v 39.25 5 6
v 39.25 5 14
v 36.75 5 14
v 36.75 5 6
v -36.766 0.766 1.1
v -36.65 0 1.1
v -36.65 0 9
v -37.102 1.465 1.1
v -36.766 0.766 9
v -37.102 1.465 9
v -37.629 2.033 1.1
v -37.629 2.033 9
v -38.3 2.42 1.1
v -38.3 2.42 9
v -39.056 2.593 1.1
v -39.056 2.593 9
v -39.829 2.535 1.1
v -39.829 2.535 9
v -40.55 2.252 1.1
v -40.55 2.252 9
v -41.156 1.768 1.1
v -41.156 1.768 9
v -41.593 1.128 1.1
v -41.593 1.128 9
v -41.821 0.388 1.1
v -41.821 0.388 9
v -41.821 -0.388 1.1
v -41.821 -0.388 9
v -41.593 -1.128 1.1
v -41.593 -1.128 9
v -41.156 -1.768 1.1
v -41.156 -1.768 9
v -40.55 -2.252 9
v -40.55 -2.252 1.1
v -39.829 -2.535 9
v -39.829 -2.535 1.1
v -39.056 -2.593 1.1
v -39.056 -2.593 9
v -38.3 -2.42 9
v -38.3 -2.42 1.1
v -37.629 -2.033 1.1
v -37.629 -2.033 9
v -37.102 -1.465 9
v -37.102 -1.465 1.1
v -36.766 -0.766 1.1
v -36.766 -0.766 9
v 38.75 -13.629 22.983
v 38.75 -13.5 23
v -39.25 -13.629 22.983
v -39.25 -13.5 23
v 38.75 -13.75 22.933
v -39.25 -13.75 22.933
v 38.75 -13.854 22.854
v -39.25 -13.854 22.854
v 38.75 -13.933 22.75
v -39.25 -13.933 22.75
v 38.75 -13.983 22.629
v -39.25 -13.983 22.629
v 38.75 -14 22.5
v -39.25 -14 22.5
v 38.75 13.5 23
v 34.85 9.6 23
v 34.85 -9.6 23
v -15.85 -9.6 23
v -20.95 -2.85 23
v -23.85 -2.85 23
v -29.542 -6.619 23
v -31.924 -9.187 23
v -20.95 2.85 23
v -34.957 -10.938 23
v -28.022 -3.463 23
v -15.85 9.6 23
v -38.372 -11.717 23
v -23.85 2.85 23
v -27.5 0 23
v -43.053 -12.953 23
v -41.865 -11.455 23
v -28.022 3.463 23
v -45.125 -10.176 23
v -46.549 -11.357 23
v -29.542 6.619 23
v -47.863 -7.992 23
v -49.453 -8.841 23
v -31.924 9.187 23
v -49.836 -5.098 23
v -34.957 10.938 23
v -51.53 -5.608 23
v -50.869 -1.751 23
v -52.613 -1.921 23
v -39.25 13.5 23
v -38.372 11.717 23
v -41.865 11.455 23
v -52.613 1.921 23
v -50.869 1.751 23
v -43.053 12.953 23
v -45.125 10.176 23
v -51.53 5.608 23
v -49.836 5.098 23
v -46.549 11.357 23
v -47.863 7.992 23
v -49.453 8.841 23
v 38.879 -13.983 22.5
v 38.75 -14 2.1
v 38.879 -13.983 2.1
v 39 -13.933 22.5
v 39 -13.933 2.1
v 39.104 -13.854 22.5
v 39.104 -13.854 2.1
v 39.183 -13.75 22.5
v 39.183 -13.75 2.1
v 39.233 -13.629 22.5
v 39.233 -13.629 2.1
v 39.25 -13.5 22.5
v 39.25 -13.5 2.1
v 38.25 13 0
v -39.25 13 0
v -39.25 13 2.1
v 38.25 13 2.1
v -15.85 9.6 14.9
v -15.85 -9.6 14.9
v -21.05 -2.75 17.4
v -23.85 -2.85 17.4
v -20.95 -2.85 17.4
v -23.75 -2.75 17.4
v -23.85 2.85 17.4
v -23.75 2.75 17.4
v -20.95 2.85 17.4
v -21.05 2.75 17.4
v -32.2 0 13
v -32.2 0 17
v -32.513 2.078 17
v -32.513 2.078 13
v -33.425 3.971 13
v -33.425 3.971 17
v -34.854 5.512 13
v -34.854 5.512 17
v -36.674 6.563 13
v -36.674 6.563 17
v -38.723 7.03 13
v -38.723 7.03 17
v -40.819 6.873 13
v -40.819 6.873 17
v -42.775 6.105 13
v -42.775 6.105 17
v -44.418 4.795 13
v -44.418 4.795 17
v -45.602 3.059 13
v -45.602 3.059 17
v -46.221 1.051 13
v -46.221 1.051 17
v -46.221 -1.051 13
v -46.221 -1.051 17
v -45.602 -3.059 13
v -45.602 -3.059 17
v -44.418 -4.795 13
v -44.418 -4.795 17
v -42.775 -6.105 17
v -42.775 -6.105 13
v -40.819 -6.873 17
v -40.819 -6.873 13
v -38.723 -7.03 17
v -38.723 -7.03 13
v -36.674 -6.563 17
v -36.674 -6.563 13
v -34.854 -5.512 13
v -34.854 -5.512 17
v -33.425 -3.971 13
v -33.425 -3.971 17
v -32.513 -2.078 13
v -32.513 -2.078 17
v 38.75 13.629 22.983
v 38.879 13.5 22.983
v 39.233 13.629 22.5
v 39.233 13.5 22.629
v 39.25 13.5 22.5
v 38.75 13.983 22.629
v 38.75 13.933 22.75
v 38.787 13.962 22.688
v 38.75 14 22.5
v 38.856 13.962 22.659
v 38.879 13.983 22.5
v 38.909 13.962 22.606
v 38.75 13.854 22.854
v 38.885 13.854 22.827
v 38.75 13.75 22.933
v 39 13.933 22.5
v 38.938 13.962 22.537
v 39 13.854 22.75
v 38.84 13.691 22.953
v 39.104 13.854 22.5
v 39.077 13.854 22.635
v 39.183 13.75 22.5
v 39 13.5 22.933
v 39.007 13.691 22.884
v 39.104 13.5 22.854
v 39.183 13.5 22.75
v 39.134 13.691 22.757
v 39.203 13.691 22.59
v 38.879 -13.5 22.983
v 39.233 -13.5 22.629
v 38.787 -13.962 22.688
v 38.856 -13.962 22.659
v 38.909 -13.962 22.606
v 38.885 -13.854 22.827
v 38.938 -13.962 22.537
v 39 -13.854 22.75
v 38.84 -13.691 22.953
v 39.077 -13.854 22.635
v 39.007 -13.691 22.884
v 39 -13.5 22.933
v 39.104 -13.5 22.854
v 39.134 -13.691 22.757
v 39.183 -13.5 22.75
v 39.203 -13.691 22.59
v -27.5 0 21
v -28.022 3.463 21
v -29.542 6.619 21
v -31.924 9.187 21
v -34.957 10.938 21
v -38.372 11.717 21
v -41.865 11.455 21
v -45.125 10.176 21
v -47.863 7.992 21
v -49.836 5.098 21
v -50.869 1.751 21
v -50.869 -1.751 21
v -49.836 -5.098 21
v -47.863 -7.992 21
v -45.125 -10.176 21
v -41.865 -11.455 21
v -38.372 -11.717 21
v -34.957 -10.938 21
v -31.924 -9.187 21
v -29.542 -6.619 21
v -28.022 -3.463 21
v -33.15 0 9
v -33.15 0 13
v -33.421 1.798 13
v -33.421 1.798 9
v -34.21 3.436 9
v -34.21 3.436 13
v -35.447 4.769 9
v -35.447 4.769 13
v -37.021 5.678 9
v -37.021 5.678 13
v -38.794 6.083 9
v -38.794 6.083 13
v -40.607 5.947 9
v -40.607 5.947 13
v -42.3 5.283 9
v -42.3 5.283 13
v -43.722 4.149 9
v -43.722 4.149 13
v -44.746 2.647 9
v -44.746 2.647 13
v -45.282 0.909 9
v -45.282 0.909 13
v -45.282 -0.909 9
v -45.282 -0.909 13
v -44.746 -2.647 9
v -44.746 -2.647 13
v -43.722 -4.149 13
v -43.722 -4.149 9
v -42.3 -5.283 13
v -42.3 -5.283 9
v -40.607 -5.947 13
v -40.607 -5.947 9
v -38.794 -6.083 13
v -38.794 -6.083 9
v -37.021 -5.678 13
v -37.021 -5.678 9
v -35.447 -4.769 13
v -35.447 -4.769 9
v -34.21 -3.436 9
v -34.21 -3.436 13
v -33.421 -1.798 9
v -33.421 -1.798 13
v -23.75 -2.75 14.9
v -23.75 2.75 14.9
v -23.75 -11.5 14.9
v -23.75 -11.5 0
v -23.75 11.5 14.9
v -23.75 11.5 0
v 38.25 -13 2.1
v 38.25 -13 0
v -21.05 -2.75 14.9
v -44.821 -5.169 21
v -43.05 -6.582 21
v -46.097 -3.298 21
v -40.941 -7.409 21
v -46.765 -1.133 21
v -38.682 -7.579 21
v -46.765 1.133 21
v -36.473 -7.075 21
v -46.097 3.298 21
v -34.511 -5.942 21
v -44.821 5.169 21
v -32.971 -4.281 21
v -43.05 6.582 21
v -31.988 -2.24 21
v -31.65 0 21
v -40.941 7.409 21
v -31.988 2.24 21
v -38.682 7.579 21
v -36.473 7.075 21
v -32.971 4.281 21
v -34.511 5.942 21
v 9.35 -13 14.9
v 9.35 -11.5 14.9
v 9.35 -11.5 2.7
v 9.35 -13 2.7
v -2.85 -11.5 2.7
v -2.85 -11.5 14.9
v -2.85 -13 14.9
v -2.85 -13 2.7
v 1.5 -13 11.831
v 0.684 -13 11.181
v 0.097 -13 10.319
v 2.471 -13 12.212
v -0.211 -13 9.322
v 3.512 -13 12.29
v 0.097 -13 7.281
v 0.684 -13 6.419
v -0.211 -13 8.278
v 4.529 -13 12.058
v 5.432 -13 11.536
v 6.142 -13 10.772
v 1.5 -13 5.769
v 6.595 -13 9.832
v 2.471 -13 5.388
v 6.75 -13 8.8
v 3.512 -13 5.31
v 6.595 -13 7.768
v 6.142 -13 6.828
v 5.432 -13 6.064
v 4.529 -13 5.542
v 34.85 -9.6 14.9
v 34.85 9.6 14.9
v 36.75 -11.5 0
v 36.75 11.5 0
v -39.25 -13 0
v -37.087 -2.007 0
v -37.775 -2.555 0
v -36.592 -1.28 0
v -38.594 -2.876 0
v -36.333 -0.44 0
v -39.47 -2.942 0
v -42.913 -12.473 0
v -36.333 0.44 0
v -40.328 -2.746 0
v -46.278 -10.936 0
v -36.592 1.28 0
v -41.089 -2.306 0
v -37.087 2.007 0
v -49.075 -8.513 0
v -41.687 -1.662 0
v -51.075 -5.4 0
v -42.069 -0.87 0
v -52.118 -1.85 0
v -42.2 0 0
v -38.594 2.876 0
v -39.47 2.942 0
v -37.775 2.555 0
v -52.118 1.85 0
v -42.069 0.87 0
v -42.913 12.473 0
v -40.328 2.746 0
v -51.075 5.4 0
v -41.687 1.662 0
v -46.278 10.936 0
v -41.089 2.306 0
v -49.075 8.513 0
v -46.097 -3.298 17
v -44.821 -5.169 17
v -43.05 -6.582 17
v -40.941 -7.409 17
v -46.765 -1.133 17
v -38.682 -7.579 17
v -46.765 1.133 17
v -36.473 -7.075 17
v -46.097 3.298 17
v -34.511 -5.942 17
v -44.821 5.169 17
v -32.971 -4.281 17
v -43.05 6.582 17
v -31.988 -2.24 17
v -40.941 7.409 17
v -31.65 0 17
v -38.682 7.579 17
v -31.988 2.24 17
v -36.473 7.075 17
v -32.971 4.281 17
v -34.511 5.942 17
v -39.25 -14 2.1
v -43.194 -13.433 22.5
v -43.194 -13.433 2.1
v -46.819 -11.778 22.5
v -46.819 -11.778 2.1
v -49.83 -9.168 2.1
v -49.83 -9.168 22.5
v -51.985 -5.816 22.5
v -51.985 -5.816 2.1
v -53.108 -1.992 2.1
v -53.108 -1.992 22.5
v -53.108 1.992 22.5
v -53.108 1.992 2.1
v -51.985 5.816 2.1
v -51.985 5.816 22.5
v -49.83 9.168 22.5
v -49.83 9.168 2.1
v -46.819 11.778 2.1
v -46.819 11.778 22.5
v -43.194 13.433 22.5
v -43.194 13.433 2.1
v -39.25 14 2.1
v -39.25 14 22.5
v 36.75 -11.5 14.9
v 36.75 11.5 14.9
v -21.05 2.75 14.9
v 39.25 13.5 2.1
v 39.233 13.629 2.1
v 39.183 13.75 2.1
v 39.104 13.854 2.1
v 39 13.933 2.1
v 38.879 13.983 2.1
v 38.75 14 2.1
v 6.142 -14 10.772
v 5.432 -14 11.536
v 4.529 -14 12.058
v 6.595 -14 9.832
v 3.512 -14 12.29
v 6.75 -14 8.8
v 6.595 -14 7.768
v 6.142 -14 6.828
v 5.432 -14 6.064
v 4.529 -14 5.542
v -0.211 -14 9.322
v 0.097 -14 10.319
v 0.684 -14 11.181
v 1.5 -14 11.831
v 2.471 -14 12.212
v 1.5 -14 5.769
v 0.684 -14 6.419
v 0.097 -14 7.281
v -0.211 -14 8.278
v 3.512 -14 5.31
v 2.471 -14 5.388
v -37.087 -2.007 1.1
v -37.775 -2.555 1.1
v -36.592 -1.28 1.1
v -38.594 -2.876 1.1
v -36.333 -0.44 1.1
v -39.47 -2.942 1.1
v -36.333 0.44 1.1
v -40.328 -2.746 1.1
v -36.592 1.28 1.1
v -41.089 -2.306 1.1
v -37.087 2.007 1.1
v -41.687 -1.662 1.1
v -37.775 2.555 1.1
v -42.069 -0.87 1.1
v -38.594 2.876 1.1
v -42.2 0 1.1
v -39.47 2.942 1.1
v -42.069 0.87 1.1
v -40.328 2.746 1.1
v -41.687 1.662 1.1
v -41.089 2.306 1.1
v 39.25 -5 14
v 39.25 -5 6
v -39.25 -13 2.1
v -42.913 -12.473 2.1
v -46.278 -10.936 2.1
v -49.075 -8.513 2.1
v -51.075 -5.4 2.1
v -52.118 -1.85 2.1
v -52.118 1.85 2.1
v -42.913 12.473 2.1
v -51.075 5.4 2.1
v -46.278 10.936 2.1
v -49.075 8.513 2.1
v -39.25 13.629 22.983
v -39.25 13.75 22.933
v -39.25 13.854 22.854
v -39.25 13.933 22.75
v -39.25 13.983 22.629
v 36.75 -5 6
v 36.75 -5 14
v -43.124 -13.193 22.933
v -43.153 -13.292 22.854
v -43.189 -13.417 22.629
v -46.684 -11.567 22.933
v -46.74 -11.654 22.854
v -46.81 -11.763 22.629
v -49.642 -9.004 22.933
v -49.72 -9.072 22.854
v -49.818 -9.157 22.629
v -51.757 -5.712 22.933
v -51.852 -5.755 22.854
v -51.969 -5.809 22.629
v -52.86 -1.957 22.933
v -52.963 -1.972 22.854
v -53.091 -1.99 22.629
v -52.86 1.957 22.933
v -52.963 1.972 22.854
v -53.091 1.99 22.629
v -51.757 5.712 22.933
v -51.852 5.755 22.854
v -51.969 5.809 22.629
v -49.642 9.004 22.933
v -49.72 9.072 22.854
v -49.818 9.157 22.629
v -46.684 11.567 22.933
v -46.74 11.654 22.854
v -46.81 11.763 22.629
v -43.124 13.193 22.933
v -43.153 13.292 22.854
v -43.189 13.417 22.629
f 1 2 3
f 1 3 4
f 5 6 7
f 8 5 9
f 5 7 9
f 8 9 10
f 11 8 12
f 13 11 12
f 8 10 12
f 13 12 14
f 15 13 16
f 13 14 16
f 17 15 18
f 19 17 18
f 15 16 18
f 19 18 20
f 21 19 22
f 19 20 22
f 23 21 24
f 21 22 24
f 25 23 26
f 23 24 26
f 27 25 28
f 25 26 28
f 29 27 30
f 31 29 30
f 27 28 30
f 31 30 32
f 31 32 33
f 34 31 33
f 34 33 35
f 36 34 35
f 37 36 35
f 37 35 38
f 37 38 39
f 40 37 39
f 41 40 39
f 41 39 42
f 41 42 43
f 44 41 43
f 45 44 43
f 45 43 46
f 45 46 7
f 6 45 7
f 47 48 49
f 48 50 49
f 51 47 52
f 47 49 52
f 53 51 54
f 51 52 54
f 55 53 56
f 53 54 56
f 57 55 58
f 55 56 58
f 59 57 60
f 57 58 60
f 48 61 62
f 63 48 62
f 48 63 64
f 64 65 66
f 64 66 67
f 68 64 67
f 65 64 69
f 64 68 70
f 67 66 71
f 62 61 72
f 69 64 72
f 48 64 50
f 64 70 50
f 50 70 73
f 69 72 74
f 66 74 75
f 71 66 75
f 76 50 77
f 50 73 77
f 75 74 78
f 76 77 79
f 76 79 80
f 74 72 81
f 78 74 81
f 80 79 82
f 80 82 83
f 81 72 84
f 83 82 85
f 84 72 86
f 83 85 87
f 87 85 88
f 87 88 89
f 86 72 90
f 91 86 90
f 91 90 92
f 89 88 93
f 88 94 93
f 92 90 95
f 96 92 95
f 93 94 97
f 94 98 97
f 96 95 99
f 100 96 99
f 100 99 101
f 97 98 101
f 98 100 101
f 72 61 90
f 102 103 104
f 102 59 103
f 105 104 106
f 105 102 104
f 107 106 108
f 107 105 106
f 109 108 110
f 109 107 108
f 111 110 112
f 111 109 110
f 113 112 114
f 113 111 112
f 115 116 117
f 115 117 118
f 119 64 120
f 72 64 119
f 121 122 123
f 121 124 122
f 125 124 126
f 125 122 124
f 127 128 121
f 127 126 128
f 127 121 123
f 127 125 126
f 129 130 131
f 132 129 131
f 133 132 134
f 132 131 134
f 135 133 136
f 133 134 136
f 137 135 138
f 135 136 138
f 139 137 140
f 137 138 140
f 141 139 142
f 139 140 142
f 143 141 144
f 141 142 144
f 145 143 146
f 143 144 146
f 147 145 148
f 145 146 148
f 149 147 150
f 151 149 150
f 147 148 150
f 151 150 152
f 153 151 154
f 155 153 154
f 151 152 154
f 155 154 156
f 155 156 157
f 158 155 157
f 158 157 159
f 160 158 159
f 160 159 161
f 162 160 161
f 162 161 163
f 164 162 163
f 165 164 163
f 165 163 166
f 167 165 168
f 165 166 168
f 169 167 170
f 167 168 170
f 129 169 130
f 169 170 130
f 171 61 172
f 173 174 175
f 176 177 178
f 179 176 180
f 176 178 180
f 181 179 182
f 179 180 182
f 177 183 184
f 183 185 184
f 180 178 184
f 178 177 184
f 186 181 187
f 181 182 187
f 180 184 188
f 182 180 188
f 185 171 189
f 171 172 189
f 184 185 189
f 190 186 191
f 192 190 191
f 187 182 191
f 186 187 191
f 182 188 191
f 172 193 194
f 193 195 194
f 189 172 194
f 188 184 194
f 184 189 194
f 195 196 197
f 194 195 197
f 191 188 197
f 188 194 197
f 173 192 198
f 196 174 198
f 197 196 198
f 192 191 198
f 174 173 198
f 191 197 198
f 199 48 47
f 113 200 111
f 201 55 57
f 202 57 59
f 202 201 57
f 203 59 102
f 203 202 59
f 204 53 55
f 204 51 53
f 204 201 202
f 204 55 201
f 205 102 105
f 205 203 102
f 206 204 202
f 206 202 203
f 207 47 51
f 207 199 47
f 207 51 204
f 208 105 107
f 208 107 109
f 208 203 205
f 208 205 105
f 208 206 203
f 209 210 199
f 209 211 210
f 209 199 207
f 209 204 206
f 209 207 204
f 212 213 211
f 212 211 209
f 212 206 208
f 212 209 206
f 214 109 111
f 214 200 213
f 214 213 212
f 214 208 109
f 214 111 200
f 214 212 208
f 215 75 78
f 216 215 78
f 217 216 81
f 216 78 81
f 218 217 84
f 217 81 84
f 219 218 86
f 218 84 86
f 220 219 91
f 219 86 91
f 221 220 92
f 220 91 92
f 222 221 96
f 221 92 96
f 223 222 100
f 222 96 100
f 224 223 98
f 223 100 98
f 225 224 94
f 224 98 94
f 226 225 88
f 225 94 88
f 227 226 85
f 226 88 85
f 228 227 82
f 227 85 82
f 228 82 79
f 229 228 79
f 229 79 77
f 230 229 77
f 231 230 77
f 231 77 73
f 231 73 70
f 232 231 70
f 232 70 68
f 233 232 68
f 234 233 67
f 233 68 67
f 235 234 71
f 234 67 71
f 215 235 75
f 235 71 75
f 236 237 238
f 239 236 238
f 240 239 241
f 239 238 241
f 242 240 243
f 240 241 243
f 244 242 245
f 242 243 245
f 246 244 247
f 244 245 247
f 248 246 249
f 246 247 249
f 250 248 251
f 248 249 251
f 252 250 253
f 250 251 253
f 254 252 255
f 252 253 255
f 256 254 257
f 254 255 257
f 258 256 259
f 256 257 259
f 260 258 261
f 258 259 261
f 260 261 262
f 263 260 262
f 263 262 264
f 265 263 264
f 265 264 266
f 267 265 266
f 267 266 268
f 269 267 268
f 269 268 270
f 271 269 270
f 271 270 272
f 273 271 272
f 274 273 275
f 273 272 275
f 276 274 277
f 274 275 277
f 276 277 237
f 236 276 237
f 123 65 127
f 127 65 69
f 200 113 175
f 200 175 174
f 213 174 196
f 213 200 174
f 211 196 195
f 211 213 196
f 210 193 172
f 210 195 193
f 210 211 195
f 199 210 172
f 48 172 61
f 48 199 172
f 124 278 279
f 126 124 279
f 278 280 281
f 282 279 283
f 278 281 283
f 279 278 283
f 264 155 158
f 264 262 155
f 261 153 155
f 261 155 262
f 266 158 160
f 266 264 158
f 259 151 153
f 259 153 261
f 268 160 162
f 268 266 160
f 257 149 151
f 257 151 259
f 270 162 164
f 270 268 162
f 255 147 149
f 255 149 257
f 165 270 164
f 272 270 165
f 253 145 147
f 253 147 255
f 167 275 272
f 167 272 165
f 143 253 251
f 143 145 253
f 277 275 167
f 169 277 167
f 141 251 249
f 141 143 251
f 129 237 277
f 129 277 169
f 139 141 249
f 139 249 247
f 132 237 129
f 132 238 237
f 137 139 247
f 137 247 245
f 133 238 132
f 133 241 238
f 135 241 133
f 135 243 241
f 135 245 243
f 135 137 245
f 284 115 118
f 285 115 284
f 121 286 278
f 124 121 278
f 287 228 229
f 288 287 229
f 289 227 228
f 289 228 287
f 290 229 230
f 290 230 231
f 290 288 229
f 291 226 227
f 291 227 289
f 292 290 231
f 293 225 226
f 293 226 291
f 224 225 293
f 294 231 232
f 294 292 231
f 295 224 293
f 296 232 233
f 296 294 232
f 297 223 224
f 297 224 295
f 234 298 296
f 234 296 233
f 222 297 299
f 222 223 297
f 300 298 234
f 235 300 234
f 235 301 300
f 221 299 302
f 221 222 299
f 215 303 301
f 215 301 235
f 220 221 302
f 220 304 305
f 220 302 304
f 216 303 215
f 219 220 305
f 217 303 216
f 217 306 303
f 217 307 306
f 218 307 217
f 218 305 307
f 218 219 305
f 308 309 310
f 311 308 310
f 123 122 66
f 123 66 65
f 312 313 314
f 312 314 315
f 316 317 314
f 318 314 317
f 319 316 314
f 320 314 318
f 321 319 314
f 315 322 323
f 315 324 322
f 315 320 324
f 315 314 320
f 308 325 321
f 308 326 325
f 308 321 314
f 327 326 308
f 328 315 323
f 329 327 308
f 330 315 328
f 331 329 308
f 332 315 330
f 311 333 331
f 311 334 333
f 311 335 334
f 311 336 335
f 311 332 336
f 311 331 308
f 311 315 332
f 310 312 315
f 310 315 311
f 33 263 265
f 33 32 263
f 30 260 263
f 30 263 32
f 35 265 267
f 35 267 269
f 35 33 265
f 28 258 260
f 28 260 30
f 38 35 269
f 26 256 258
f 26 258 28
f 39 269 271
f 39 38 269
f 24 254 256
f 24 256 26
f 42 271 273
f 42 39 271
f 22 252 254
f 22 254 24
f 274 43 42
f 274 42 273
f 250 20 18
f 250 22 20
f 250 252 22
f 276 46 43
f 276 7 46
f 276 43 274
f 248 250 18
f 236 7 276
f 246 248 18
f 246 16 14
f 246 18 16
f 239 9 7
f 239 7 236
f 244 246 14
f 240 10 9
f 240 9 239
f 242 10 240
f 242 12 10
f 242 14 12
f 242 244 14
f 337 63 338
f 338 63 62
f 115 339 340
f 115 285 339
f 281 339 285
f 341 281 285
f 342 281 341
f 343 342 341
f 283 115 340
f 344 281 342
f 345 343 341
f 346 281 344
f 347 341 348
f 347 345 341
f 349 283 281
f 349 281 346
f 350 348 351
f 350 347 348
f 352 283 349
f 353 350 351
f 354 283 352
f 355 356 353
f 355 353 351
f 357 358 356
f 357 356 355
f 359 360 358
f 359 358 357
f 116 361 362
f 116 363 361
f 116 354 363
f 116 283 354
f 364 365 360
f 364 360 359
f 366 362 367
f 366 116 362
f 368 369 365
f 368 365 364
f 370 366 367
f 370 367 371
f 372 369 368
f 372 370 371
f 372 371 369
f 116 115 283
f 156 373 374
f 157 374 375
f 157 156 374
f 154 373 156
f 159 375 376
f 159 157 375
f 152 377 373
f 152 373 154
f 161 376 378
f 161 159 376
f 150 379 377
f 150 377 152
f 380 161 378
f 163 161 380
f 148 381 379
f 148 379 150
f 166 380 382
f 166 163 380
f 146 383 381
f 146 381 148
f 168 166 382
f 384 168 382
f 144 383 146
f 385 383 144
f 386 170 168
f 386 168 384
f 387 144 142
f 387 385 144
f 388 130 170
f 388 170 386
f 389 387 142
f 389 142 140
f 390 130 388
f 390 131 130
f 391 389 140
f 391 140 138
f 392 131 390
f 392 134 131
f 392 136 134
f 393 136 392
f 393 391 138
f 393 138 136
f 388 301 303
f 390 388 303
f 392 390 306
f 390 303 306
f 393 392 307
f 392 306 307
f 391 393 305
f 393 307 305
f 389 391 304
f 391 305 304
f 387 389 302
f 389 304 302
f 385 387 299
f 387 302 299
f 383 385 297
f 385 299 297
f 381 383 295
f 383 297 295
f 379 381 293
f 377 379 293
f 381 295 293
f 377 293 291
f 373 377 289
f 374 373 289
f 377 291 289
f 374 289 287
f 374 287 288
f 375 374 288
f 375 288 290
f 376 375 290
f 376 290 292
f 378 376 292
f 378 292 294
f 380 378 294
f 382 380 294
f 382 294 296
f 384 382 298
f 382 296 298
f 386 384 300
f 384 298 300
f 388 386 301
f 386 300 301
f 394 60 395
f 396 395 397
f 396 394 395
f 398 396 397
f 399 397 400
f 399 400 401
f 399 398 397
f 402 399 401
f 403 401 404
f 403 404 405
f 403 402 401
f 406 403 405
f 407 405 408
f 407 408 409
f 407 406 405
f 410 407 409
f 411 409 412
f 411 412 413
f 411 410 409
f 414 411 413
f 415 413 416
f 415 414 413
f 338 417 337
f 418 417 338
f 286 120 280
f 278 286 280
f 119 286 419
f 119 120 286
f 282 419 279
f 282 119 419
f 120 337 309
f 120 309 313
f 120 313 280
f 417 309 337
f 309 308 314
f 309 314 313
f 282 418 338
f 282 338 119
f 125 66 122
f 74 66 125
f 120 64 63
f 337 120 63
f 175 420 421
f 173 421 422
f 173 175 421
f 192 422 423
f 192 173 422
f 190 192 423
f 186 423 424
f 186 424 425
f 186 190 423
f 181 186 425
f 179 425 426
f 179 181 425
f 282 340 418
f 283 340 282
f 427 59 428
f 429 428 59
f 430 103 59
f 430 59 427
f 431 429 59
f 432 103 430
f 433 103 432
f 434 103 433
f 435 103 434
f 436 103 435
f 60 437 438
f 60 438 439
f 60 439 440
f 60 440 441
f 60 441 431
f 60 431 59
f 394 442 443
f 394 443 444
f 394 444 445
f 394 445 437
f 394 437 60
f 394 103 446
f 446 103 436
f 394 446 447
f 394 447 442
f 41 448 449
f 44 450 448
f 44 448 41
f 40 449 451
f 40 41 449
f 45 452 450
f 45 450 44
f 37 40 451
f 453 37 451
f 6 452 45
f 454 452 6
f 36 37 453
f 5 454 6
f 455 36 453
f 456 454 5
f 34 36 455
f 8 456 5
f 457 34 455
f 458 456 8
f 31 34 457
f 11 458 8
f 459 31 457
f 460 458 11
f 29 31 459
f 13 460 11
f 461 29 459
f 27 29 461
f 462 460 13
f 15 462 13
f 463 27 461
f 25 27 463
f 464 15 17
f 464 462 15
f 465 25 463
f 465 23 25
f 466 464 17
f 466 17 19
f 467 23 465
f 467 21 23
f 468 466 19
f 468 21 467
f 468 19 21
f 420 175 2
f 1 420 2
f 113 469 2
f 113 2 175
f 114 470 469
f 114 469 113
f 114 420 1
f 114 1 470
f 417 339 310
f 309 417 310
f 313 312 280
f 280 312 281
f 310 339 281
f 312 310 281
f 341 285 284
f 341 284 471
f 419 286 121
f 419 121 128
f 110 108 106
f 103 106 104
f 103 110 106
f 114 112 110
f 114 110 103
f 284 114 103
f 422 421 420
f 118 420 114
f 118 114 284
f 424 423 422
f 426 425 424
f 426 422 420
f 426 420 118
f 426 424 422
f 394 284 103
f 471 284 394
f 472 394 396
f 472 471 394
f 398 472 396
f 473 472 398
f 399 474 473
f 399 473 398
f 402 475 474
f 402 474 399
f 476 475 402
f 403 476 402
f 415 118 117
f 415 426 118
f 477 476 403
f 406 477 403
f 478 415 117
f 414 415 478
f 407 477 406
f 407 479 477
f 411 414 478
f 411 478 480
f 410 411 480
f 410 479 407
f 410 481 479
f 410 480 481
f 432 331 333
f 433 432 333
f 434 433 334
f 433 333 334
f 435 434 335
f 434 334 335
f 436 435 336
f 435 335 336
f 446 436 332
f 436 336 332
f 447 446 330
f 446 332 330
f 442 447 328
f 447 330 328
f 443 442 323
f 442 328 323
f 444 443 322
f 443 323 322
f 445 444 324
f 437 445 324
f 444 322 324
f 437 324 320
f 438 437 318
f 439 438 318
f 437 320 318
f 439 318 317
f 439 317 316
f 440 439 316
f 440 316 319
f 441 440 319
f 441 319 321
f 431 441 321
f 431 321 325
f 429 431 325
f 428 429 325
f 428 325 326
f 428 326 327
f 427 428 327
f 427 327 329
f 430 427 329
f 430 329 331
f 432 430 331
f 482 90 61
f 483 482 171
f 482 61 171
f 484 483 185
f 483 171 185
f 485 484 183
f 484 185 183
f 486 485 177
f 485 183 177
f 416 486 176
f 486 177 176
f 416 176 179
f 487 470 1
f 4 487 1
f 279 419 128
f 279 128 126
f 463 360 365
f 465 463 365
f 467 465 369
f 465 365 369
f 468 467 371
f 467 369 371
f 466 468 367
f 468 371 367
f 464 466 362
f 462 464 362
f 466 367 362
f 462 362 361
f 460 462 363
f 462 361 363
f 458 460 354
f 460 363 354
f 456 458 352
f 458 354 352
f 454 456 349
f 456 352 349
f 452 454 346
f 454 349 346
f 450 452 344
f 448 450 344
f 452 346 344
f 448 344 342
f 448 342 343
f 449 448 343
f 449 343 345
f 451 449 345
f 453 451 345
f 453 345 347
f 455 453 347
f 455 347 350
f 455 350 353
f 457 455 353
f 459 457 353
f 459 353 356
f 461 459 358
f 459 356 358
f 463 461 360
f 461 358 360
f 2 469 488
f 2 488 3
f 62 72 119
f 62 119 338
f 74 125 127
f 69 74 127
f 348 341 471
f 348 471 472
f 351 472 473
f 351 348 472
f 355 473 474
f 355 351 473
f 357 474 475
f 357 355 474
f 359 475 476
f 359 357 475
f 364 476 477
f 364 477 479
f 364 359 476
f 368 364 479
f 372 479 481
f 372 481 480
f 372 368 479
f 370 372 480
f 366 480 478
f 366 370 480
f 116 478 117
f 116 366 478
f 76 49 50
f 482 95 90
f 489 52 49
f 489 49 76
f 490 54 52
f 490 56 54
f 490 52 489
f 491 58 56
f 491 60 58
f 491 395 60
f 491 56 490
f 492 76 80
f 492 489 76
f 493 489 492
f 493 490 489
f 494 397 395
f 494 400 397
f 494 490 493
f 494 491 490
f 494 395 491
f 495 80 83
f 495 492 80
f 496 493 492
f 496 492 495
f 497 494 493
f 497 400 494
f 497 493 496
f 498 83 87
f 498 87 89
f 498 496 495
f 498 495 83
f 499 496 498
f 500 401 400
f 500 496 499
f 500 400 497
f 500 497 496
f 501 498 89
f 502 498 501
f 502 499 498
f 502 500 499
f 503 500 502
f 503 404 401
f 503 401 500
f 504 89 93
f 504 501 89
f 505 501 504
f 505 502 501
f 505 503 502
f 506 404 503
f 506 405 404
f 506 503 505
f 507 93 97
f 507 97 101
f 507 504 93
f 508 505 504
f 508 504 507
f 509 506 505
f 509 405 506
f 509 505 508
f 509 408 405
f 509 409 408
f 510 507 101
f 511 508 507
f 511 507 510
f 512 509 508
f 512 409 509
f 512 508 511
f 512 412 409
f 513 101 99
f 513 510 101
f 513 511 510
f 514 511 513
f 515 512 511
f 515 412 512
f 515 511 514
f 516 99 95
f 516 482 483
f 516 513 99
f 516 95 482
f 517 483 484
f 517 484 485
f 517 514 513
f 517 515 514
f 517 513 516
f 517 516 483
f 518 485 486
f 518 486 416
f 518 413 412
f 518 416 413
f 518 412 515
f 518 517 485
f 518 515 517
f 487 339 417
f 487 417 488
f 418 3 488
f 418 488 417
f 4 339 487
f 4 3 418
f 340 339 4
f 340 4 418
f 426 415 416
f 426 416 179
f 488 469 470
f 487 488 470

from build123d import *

# Parameters (mm, degrees)
EXTRUDE_1_DEPTH       = 23
SKETCH_2_R            = 11.75
CUT_EXTRUDE_1_DEPTH   = 2
SKETCH_3_R            = 7.6
CUT_EXTRUDE_2_DEPTH   = 4
SKETCH_4_R            = 7.05
CUT_EXTRUDE_3_DEPTH   = 4
SKETCH_5_R            = 6.1
CUT_EXTRUDE_4_DEPTH   = 4
SKETCH_6_R            = 2.6
CUT_EXTRUDE_5_DEPTH   = 9
SKETCH_7_R            = 2.95
CUT_EXTRUDE_6_DEPTH   = 1.1
SKETCH_8_W            = 50.7
SKETCH_8_H            = 19.2
CUT_EXTRUDE_7_DEPTH   = 8.1
SKETCH_9_W            = 60.5
SKETCH_9_H            = 23
CUT_EXTRUDE_8_DEPTH   = 14.9
CUT_EXTRUDE_9_REACH   = 94.5
SKETCH_10_W           = 8
SKETCH_10_H           = 10
CUT_EXTRUDE_1_2_DEPTH = 2.1
SKETCH_13_W           = 12.2
SKETCH_13_H           = 12.2
CUT_EXTRUDE_11_DEPTH  = 1.5
CUT_EXTRUDE_14_REACH  = 3
SKETCH_16_R           = 3.5
SKETCH_14_W           = 2.7
SKETCH_14_H           = 5.5
CUT_EXTRUDE_12_DEPTH  = 12
SKETCH_15_W           = 2.9
SKETCH_15_H           = 5.7
CUT_EXTRUDE_13_DEPTH  = 5.6
FILLET_1_R            = 0.5


with BuildPart() as part:
    # Эскиз1 → Бобышка-Вытянуть1 (new body)
    with BuildSketch(Plane.XY):
        with BuildLine():
            Line((39.25, -14), (-39.25, -14))
            ThreePointArc((-39.25, -14), (-53.25, 0), (-39.25, 14))
            Line((-39.25, 14), (39.25, 14))
            Line((39.25, 14), (39.25, -14))
        make_face()
    extrude(amount=EXTRUDE_1_DEPTH)

    # Эскиз2 → Cut-Extrude 1 (cut)
    with BuildSketch(Plane.XY.offset(23)):
        with Locations((-39.25, 0)):
            Circle(SKETCH_2_R)
    extrude(amount=-CUT_EXTRUDE_1_DEPTH, mode=Mode.SUBTRACT)

    # Эскиз3 → Вырез-Вытянуть2 (cut)
    with BuildSketch(Plane.XY.offset(21)):
        with Locations((-39.25, 0)):
            Circle(SKETCH_3_R)
    extrude(amount=-CUT_EXTRUDE_2_DEPTH, mode=Mode.SUBTRACT)

    # Эскиз4 → Вырез-Вытянуть3 (cut)
    with BuildSketch(Plane.XY.offset(17)):
        with Locations((-39.25, 0)):
            Circle(SKETCH_4_R)
    extrude(amount=-CUT_EXTRUDE_3_DEPTH, mode=Mode.SUBTRACT)

    # Эскиз5 → Вырез-Вытянуть4 (cut)
    with BuildSketch(Plane.XY.offset(13)):
        with Locations((-39.25, 0)):
            Circle(SKETCH_5_R)
    extrude(amount=-CUT_EXTRUDE_4_DEPTH, mode=Mode.SUBTRACT)

    # Эскиз6 → Вырез-Вытянуть5 (cut)
    with BuildSketch(Plane.XY.offset(9)):
        with Locations((-39.25, 0)):
            Circle(SKETCH_6_R)
    extrude(amount=-CUT_EXTRUDE_5_DEPTH, mode=Mode.SUBTRACT)

    # Эскиз7 → Вырез-Вытянуть6 (cut)
    with BuildSketch(Plane(origin=(0, 0, 0), x_dir=(-1, 0, 0), z_dir=(0, 0, -1))):
        with Locations((39.25, 0)):
            Circle(SKETCH_7_R)
    extrude(amount=-CUT_EXTRUDE_6_DEPTH, mode=Mode.SUBTRACT)

    # Эскиз8 → Вырез-Вытянуть7 (cut)
    with BuildSketch(Plane.XY.offset(23)):
        with Locations((9.5, 0)):
            Rectangle(SKETCH_8_W, SKETCH_8_H)
    extrude(amount=-CUT_EXTRUDE_7_DEPTH, mode=Mode.SUBTRACT)

    # Эскиз9 → Вырез-Вытянуть8 (cut)
    with BuildSketch(Plane(origin=(0, 0, 0), x_dir=(-1, 0, 0), z_dir=(0, 0, -1))):
        with Locations((-6.5, 0)):
            Rectangle(SKETCH_9_W, SKETCH_9_H)
    extrude(amount=-CUT_EXTRUDE_8_DEPTH, mode=Mode.SUBTRACT)

    # Эскиз10 → Вырез-Вытянуть9 (cut, up to next)
    with BuildSketch(Plane(origin=(39.25, 0, 0), x_dir=(0, 0, -1), z_dir=(1, 0, 0)), mode=Mode.PRIVATE) as cut_extrude_9_sk1:
        with Locations((-10, 0)):
            Rectangle(SKETCH_10_W, SKETCH_10_H)
    cut_extrude_9_tool1 = extrude(cut_extrude_9_sk1.sketch, amount=-CUT_EXTRUDE_9_REACH, mode=Mode.PRIVATE) & part.part
    add(cut_extrude_9_tool1.solids().sort_by_distance((39.25, 0, 10))[0], mode=Mode.SUBTRACT)

    # Эскиз11 → Cut-Extrude 1 2 (cut)
    with BuildSketch(Plane(origin=(0, 0, 0), x_dir=(-1, 0, 0), z_dir=(0, 0, -1))):
        with BuildLine():
            Line((39.25, 15), (-40.25, 15))
            Line((-40.25, 15), (-40.25, -15))
            Line((-40.25, -15), (39.25, -15))
            ThreePointArc((39.25, -15), (54.25, 0), (39.25, 15))
        make_face()
        with BuildLine():
            Line((39.25, 13), (-38.25, 13))
            Line((-38.25, 13), (-38.25, -13))
            Line((-38.25, -13), (39.25, -13))
            ThreePointArc((39.25, -13), (52.25, 0), (39.25, 13))
        make_face(mode=Mode.SUBTRACT)
    extrude(amount=-CUT_EXTRUDE_1_2_DEPTH, mode=Mode.SUBTRACT)

    # Эскиз13 → Вырез-Вытянуть11 (cut)
    with BuildSketch(Plane(origin=(0, -11.5, 0), x_dir=(1, 0, 0), z_dir=(0, 1, 0))):
        with Locations((3.25, -8.8)):
            Rectangle(SKETCH_13_W, SKETCH_13_H)
    extrude(amount=-CUT_EXTRUDE_11_DEPTH, mode=Mode.SUBTRACT)

    # Эскиз16 → Вырез-Вытянуть14 (cut, up to next)
    with BuildSketch(Plane(origin=(0, -13, 0), x_dir=(1, 0, 0), z_dir=(0, 1, 0)), mode=Mode.PRIVATE) as cut_extrude_14_sk1:
        with Locations((3.25, -8.8)):
            Circle(SKETCH_16_R)
    cut_extrude_14_tool1 = extrude(cut_extrude_14_sk1.sketch, amount=-CUT_EXTRUDE_14_REACH, mode=Mode.PRIVATE) & part.part
    add(cut_extrude_14_tool1.solids().sort_by_distance((3.25, -13, 8.8))[0], mode=Mode.SUBTRACT)

    # Эскиз14 → Вырез-Вытянуть12 (cut)
    with BuildSketch(Plane(origin=(0, 0, 14.9), x_dir=(-1, 0, 0), z_dir=(0, 0, -1))):
        with Locations((22.4, 0)):
            Rectangle(SKETCH_14_W, SKETCH_14_H)
    extrude(amount=-CUT_EXTRUDE_12_DEPTH, mode=Mode.SUBTRACT)

    # Эскиз15 → Вырез-Вытянуть13 (cut)
    with BuildSketch(Plane.XY.offset(23)):
        with Locations((-22.4, 0)):
            Rectangle(SKETCH_15_W, SKETCH_15_H)
    extrude(amount=-CUT_EXTRUDE_13_DEPTH, mode=Mode.SUBTRACT)

    # Скругление1
    fillet_1_edges = [part.edges().sort_by_distance(p)[0] for p in [
        (39.25, 0, 23),
        (0, 14, 23),
        (-53.25, 0, 23),
        (0, -14, 23),
        (39.25, 14, 12.55),
        (39.25, -14, 12.55),
    ]]
    fillet(fillet_1_edges, radius=FILLET_1_R)


solid = part.part
